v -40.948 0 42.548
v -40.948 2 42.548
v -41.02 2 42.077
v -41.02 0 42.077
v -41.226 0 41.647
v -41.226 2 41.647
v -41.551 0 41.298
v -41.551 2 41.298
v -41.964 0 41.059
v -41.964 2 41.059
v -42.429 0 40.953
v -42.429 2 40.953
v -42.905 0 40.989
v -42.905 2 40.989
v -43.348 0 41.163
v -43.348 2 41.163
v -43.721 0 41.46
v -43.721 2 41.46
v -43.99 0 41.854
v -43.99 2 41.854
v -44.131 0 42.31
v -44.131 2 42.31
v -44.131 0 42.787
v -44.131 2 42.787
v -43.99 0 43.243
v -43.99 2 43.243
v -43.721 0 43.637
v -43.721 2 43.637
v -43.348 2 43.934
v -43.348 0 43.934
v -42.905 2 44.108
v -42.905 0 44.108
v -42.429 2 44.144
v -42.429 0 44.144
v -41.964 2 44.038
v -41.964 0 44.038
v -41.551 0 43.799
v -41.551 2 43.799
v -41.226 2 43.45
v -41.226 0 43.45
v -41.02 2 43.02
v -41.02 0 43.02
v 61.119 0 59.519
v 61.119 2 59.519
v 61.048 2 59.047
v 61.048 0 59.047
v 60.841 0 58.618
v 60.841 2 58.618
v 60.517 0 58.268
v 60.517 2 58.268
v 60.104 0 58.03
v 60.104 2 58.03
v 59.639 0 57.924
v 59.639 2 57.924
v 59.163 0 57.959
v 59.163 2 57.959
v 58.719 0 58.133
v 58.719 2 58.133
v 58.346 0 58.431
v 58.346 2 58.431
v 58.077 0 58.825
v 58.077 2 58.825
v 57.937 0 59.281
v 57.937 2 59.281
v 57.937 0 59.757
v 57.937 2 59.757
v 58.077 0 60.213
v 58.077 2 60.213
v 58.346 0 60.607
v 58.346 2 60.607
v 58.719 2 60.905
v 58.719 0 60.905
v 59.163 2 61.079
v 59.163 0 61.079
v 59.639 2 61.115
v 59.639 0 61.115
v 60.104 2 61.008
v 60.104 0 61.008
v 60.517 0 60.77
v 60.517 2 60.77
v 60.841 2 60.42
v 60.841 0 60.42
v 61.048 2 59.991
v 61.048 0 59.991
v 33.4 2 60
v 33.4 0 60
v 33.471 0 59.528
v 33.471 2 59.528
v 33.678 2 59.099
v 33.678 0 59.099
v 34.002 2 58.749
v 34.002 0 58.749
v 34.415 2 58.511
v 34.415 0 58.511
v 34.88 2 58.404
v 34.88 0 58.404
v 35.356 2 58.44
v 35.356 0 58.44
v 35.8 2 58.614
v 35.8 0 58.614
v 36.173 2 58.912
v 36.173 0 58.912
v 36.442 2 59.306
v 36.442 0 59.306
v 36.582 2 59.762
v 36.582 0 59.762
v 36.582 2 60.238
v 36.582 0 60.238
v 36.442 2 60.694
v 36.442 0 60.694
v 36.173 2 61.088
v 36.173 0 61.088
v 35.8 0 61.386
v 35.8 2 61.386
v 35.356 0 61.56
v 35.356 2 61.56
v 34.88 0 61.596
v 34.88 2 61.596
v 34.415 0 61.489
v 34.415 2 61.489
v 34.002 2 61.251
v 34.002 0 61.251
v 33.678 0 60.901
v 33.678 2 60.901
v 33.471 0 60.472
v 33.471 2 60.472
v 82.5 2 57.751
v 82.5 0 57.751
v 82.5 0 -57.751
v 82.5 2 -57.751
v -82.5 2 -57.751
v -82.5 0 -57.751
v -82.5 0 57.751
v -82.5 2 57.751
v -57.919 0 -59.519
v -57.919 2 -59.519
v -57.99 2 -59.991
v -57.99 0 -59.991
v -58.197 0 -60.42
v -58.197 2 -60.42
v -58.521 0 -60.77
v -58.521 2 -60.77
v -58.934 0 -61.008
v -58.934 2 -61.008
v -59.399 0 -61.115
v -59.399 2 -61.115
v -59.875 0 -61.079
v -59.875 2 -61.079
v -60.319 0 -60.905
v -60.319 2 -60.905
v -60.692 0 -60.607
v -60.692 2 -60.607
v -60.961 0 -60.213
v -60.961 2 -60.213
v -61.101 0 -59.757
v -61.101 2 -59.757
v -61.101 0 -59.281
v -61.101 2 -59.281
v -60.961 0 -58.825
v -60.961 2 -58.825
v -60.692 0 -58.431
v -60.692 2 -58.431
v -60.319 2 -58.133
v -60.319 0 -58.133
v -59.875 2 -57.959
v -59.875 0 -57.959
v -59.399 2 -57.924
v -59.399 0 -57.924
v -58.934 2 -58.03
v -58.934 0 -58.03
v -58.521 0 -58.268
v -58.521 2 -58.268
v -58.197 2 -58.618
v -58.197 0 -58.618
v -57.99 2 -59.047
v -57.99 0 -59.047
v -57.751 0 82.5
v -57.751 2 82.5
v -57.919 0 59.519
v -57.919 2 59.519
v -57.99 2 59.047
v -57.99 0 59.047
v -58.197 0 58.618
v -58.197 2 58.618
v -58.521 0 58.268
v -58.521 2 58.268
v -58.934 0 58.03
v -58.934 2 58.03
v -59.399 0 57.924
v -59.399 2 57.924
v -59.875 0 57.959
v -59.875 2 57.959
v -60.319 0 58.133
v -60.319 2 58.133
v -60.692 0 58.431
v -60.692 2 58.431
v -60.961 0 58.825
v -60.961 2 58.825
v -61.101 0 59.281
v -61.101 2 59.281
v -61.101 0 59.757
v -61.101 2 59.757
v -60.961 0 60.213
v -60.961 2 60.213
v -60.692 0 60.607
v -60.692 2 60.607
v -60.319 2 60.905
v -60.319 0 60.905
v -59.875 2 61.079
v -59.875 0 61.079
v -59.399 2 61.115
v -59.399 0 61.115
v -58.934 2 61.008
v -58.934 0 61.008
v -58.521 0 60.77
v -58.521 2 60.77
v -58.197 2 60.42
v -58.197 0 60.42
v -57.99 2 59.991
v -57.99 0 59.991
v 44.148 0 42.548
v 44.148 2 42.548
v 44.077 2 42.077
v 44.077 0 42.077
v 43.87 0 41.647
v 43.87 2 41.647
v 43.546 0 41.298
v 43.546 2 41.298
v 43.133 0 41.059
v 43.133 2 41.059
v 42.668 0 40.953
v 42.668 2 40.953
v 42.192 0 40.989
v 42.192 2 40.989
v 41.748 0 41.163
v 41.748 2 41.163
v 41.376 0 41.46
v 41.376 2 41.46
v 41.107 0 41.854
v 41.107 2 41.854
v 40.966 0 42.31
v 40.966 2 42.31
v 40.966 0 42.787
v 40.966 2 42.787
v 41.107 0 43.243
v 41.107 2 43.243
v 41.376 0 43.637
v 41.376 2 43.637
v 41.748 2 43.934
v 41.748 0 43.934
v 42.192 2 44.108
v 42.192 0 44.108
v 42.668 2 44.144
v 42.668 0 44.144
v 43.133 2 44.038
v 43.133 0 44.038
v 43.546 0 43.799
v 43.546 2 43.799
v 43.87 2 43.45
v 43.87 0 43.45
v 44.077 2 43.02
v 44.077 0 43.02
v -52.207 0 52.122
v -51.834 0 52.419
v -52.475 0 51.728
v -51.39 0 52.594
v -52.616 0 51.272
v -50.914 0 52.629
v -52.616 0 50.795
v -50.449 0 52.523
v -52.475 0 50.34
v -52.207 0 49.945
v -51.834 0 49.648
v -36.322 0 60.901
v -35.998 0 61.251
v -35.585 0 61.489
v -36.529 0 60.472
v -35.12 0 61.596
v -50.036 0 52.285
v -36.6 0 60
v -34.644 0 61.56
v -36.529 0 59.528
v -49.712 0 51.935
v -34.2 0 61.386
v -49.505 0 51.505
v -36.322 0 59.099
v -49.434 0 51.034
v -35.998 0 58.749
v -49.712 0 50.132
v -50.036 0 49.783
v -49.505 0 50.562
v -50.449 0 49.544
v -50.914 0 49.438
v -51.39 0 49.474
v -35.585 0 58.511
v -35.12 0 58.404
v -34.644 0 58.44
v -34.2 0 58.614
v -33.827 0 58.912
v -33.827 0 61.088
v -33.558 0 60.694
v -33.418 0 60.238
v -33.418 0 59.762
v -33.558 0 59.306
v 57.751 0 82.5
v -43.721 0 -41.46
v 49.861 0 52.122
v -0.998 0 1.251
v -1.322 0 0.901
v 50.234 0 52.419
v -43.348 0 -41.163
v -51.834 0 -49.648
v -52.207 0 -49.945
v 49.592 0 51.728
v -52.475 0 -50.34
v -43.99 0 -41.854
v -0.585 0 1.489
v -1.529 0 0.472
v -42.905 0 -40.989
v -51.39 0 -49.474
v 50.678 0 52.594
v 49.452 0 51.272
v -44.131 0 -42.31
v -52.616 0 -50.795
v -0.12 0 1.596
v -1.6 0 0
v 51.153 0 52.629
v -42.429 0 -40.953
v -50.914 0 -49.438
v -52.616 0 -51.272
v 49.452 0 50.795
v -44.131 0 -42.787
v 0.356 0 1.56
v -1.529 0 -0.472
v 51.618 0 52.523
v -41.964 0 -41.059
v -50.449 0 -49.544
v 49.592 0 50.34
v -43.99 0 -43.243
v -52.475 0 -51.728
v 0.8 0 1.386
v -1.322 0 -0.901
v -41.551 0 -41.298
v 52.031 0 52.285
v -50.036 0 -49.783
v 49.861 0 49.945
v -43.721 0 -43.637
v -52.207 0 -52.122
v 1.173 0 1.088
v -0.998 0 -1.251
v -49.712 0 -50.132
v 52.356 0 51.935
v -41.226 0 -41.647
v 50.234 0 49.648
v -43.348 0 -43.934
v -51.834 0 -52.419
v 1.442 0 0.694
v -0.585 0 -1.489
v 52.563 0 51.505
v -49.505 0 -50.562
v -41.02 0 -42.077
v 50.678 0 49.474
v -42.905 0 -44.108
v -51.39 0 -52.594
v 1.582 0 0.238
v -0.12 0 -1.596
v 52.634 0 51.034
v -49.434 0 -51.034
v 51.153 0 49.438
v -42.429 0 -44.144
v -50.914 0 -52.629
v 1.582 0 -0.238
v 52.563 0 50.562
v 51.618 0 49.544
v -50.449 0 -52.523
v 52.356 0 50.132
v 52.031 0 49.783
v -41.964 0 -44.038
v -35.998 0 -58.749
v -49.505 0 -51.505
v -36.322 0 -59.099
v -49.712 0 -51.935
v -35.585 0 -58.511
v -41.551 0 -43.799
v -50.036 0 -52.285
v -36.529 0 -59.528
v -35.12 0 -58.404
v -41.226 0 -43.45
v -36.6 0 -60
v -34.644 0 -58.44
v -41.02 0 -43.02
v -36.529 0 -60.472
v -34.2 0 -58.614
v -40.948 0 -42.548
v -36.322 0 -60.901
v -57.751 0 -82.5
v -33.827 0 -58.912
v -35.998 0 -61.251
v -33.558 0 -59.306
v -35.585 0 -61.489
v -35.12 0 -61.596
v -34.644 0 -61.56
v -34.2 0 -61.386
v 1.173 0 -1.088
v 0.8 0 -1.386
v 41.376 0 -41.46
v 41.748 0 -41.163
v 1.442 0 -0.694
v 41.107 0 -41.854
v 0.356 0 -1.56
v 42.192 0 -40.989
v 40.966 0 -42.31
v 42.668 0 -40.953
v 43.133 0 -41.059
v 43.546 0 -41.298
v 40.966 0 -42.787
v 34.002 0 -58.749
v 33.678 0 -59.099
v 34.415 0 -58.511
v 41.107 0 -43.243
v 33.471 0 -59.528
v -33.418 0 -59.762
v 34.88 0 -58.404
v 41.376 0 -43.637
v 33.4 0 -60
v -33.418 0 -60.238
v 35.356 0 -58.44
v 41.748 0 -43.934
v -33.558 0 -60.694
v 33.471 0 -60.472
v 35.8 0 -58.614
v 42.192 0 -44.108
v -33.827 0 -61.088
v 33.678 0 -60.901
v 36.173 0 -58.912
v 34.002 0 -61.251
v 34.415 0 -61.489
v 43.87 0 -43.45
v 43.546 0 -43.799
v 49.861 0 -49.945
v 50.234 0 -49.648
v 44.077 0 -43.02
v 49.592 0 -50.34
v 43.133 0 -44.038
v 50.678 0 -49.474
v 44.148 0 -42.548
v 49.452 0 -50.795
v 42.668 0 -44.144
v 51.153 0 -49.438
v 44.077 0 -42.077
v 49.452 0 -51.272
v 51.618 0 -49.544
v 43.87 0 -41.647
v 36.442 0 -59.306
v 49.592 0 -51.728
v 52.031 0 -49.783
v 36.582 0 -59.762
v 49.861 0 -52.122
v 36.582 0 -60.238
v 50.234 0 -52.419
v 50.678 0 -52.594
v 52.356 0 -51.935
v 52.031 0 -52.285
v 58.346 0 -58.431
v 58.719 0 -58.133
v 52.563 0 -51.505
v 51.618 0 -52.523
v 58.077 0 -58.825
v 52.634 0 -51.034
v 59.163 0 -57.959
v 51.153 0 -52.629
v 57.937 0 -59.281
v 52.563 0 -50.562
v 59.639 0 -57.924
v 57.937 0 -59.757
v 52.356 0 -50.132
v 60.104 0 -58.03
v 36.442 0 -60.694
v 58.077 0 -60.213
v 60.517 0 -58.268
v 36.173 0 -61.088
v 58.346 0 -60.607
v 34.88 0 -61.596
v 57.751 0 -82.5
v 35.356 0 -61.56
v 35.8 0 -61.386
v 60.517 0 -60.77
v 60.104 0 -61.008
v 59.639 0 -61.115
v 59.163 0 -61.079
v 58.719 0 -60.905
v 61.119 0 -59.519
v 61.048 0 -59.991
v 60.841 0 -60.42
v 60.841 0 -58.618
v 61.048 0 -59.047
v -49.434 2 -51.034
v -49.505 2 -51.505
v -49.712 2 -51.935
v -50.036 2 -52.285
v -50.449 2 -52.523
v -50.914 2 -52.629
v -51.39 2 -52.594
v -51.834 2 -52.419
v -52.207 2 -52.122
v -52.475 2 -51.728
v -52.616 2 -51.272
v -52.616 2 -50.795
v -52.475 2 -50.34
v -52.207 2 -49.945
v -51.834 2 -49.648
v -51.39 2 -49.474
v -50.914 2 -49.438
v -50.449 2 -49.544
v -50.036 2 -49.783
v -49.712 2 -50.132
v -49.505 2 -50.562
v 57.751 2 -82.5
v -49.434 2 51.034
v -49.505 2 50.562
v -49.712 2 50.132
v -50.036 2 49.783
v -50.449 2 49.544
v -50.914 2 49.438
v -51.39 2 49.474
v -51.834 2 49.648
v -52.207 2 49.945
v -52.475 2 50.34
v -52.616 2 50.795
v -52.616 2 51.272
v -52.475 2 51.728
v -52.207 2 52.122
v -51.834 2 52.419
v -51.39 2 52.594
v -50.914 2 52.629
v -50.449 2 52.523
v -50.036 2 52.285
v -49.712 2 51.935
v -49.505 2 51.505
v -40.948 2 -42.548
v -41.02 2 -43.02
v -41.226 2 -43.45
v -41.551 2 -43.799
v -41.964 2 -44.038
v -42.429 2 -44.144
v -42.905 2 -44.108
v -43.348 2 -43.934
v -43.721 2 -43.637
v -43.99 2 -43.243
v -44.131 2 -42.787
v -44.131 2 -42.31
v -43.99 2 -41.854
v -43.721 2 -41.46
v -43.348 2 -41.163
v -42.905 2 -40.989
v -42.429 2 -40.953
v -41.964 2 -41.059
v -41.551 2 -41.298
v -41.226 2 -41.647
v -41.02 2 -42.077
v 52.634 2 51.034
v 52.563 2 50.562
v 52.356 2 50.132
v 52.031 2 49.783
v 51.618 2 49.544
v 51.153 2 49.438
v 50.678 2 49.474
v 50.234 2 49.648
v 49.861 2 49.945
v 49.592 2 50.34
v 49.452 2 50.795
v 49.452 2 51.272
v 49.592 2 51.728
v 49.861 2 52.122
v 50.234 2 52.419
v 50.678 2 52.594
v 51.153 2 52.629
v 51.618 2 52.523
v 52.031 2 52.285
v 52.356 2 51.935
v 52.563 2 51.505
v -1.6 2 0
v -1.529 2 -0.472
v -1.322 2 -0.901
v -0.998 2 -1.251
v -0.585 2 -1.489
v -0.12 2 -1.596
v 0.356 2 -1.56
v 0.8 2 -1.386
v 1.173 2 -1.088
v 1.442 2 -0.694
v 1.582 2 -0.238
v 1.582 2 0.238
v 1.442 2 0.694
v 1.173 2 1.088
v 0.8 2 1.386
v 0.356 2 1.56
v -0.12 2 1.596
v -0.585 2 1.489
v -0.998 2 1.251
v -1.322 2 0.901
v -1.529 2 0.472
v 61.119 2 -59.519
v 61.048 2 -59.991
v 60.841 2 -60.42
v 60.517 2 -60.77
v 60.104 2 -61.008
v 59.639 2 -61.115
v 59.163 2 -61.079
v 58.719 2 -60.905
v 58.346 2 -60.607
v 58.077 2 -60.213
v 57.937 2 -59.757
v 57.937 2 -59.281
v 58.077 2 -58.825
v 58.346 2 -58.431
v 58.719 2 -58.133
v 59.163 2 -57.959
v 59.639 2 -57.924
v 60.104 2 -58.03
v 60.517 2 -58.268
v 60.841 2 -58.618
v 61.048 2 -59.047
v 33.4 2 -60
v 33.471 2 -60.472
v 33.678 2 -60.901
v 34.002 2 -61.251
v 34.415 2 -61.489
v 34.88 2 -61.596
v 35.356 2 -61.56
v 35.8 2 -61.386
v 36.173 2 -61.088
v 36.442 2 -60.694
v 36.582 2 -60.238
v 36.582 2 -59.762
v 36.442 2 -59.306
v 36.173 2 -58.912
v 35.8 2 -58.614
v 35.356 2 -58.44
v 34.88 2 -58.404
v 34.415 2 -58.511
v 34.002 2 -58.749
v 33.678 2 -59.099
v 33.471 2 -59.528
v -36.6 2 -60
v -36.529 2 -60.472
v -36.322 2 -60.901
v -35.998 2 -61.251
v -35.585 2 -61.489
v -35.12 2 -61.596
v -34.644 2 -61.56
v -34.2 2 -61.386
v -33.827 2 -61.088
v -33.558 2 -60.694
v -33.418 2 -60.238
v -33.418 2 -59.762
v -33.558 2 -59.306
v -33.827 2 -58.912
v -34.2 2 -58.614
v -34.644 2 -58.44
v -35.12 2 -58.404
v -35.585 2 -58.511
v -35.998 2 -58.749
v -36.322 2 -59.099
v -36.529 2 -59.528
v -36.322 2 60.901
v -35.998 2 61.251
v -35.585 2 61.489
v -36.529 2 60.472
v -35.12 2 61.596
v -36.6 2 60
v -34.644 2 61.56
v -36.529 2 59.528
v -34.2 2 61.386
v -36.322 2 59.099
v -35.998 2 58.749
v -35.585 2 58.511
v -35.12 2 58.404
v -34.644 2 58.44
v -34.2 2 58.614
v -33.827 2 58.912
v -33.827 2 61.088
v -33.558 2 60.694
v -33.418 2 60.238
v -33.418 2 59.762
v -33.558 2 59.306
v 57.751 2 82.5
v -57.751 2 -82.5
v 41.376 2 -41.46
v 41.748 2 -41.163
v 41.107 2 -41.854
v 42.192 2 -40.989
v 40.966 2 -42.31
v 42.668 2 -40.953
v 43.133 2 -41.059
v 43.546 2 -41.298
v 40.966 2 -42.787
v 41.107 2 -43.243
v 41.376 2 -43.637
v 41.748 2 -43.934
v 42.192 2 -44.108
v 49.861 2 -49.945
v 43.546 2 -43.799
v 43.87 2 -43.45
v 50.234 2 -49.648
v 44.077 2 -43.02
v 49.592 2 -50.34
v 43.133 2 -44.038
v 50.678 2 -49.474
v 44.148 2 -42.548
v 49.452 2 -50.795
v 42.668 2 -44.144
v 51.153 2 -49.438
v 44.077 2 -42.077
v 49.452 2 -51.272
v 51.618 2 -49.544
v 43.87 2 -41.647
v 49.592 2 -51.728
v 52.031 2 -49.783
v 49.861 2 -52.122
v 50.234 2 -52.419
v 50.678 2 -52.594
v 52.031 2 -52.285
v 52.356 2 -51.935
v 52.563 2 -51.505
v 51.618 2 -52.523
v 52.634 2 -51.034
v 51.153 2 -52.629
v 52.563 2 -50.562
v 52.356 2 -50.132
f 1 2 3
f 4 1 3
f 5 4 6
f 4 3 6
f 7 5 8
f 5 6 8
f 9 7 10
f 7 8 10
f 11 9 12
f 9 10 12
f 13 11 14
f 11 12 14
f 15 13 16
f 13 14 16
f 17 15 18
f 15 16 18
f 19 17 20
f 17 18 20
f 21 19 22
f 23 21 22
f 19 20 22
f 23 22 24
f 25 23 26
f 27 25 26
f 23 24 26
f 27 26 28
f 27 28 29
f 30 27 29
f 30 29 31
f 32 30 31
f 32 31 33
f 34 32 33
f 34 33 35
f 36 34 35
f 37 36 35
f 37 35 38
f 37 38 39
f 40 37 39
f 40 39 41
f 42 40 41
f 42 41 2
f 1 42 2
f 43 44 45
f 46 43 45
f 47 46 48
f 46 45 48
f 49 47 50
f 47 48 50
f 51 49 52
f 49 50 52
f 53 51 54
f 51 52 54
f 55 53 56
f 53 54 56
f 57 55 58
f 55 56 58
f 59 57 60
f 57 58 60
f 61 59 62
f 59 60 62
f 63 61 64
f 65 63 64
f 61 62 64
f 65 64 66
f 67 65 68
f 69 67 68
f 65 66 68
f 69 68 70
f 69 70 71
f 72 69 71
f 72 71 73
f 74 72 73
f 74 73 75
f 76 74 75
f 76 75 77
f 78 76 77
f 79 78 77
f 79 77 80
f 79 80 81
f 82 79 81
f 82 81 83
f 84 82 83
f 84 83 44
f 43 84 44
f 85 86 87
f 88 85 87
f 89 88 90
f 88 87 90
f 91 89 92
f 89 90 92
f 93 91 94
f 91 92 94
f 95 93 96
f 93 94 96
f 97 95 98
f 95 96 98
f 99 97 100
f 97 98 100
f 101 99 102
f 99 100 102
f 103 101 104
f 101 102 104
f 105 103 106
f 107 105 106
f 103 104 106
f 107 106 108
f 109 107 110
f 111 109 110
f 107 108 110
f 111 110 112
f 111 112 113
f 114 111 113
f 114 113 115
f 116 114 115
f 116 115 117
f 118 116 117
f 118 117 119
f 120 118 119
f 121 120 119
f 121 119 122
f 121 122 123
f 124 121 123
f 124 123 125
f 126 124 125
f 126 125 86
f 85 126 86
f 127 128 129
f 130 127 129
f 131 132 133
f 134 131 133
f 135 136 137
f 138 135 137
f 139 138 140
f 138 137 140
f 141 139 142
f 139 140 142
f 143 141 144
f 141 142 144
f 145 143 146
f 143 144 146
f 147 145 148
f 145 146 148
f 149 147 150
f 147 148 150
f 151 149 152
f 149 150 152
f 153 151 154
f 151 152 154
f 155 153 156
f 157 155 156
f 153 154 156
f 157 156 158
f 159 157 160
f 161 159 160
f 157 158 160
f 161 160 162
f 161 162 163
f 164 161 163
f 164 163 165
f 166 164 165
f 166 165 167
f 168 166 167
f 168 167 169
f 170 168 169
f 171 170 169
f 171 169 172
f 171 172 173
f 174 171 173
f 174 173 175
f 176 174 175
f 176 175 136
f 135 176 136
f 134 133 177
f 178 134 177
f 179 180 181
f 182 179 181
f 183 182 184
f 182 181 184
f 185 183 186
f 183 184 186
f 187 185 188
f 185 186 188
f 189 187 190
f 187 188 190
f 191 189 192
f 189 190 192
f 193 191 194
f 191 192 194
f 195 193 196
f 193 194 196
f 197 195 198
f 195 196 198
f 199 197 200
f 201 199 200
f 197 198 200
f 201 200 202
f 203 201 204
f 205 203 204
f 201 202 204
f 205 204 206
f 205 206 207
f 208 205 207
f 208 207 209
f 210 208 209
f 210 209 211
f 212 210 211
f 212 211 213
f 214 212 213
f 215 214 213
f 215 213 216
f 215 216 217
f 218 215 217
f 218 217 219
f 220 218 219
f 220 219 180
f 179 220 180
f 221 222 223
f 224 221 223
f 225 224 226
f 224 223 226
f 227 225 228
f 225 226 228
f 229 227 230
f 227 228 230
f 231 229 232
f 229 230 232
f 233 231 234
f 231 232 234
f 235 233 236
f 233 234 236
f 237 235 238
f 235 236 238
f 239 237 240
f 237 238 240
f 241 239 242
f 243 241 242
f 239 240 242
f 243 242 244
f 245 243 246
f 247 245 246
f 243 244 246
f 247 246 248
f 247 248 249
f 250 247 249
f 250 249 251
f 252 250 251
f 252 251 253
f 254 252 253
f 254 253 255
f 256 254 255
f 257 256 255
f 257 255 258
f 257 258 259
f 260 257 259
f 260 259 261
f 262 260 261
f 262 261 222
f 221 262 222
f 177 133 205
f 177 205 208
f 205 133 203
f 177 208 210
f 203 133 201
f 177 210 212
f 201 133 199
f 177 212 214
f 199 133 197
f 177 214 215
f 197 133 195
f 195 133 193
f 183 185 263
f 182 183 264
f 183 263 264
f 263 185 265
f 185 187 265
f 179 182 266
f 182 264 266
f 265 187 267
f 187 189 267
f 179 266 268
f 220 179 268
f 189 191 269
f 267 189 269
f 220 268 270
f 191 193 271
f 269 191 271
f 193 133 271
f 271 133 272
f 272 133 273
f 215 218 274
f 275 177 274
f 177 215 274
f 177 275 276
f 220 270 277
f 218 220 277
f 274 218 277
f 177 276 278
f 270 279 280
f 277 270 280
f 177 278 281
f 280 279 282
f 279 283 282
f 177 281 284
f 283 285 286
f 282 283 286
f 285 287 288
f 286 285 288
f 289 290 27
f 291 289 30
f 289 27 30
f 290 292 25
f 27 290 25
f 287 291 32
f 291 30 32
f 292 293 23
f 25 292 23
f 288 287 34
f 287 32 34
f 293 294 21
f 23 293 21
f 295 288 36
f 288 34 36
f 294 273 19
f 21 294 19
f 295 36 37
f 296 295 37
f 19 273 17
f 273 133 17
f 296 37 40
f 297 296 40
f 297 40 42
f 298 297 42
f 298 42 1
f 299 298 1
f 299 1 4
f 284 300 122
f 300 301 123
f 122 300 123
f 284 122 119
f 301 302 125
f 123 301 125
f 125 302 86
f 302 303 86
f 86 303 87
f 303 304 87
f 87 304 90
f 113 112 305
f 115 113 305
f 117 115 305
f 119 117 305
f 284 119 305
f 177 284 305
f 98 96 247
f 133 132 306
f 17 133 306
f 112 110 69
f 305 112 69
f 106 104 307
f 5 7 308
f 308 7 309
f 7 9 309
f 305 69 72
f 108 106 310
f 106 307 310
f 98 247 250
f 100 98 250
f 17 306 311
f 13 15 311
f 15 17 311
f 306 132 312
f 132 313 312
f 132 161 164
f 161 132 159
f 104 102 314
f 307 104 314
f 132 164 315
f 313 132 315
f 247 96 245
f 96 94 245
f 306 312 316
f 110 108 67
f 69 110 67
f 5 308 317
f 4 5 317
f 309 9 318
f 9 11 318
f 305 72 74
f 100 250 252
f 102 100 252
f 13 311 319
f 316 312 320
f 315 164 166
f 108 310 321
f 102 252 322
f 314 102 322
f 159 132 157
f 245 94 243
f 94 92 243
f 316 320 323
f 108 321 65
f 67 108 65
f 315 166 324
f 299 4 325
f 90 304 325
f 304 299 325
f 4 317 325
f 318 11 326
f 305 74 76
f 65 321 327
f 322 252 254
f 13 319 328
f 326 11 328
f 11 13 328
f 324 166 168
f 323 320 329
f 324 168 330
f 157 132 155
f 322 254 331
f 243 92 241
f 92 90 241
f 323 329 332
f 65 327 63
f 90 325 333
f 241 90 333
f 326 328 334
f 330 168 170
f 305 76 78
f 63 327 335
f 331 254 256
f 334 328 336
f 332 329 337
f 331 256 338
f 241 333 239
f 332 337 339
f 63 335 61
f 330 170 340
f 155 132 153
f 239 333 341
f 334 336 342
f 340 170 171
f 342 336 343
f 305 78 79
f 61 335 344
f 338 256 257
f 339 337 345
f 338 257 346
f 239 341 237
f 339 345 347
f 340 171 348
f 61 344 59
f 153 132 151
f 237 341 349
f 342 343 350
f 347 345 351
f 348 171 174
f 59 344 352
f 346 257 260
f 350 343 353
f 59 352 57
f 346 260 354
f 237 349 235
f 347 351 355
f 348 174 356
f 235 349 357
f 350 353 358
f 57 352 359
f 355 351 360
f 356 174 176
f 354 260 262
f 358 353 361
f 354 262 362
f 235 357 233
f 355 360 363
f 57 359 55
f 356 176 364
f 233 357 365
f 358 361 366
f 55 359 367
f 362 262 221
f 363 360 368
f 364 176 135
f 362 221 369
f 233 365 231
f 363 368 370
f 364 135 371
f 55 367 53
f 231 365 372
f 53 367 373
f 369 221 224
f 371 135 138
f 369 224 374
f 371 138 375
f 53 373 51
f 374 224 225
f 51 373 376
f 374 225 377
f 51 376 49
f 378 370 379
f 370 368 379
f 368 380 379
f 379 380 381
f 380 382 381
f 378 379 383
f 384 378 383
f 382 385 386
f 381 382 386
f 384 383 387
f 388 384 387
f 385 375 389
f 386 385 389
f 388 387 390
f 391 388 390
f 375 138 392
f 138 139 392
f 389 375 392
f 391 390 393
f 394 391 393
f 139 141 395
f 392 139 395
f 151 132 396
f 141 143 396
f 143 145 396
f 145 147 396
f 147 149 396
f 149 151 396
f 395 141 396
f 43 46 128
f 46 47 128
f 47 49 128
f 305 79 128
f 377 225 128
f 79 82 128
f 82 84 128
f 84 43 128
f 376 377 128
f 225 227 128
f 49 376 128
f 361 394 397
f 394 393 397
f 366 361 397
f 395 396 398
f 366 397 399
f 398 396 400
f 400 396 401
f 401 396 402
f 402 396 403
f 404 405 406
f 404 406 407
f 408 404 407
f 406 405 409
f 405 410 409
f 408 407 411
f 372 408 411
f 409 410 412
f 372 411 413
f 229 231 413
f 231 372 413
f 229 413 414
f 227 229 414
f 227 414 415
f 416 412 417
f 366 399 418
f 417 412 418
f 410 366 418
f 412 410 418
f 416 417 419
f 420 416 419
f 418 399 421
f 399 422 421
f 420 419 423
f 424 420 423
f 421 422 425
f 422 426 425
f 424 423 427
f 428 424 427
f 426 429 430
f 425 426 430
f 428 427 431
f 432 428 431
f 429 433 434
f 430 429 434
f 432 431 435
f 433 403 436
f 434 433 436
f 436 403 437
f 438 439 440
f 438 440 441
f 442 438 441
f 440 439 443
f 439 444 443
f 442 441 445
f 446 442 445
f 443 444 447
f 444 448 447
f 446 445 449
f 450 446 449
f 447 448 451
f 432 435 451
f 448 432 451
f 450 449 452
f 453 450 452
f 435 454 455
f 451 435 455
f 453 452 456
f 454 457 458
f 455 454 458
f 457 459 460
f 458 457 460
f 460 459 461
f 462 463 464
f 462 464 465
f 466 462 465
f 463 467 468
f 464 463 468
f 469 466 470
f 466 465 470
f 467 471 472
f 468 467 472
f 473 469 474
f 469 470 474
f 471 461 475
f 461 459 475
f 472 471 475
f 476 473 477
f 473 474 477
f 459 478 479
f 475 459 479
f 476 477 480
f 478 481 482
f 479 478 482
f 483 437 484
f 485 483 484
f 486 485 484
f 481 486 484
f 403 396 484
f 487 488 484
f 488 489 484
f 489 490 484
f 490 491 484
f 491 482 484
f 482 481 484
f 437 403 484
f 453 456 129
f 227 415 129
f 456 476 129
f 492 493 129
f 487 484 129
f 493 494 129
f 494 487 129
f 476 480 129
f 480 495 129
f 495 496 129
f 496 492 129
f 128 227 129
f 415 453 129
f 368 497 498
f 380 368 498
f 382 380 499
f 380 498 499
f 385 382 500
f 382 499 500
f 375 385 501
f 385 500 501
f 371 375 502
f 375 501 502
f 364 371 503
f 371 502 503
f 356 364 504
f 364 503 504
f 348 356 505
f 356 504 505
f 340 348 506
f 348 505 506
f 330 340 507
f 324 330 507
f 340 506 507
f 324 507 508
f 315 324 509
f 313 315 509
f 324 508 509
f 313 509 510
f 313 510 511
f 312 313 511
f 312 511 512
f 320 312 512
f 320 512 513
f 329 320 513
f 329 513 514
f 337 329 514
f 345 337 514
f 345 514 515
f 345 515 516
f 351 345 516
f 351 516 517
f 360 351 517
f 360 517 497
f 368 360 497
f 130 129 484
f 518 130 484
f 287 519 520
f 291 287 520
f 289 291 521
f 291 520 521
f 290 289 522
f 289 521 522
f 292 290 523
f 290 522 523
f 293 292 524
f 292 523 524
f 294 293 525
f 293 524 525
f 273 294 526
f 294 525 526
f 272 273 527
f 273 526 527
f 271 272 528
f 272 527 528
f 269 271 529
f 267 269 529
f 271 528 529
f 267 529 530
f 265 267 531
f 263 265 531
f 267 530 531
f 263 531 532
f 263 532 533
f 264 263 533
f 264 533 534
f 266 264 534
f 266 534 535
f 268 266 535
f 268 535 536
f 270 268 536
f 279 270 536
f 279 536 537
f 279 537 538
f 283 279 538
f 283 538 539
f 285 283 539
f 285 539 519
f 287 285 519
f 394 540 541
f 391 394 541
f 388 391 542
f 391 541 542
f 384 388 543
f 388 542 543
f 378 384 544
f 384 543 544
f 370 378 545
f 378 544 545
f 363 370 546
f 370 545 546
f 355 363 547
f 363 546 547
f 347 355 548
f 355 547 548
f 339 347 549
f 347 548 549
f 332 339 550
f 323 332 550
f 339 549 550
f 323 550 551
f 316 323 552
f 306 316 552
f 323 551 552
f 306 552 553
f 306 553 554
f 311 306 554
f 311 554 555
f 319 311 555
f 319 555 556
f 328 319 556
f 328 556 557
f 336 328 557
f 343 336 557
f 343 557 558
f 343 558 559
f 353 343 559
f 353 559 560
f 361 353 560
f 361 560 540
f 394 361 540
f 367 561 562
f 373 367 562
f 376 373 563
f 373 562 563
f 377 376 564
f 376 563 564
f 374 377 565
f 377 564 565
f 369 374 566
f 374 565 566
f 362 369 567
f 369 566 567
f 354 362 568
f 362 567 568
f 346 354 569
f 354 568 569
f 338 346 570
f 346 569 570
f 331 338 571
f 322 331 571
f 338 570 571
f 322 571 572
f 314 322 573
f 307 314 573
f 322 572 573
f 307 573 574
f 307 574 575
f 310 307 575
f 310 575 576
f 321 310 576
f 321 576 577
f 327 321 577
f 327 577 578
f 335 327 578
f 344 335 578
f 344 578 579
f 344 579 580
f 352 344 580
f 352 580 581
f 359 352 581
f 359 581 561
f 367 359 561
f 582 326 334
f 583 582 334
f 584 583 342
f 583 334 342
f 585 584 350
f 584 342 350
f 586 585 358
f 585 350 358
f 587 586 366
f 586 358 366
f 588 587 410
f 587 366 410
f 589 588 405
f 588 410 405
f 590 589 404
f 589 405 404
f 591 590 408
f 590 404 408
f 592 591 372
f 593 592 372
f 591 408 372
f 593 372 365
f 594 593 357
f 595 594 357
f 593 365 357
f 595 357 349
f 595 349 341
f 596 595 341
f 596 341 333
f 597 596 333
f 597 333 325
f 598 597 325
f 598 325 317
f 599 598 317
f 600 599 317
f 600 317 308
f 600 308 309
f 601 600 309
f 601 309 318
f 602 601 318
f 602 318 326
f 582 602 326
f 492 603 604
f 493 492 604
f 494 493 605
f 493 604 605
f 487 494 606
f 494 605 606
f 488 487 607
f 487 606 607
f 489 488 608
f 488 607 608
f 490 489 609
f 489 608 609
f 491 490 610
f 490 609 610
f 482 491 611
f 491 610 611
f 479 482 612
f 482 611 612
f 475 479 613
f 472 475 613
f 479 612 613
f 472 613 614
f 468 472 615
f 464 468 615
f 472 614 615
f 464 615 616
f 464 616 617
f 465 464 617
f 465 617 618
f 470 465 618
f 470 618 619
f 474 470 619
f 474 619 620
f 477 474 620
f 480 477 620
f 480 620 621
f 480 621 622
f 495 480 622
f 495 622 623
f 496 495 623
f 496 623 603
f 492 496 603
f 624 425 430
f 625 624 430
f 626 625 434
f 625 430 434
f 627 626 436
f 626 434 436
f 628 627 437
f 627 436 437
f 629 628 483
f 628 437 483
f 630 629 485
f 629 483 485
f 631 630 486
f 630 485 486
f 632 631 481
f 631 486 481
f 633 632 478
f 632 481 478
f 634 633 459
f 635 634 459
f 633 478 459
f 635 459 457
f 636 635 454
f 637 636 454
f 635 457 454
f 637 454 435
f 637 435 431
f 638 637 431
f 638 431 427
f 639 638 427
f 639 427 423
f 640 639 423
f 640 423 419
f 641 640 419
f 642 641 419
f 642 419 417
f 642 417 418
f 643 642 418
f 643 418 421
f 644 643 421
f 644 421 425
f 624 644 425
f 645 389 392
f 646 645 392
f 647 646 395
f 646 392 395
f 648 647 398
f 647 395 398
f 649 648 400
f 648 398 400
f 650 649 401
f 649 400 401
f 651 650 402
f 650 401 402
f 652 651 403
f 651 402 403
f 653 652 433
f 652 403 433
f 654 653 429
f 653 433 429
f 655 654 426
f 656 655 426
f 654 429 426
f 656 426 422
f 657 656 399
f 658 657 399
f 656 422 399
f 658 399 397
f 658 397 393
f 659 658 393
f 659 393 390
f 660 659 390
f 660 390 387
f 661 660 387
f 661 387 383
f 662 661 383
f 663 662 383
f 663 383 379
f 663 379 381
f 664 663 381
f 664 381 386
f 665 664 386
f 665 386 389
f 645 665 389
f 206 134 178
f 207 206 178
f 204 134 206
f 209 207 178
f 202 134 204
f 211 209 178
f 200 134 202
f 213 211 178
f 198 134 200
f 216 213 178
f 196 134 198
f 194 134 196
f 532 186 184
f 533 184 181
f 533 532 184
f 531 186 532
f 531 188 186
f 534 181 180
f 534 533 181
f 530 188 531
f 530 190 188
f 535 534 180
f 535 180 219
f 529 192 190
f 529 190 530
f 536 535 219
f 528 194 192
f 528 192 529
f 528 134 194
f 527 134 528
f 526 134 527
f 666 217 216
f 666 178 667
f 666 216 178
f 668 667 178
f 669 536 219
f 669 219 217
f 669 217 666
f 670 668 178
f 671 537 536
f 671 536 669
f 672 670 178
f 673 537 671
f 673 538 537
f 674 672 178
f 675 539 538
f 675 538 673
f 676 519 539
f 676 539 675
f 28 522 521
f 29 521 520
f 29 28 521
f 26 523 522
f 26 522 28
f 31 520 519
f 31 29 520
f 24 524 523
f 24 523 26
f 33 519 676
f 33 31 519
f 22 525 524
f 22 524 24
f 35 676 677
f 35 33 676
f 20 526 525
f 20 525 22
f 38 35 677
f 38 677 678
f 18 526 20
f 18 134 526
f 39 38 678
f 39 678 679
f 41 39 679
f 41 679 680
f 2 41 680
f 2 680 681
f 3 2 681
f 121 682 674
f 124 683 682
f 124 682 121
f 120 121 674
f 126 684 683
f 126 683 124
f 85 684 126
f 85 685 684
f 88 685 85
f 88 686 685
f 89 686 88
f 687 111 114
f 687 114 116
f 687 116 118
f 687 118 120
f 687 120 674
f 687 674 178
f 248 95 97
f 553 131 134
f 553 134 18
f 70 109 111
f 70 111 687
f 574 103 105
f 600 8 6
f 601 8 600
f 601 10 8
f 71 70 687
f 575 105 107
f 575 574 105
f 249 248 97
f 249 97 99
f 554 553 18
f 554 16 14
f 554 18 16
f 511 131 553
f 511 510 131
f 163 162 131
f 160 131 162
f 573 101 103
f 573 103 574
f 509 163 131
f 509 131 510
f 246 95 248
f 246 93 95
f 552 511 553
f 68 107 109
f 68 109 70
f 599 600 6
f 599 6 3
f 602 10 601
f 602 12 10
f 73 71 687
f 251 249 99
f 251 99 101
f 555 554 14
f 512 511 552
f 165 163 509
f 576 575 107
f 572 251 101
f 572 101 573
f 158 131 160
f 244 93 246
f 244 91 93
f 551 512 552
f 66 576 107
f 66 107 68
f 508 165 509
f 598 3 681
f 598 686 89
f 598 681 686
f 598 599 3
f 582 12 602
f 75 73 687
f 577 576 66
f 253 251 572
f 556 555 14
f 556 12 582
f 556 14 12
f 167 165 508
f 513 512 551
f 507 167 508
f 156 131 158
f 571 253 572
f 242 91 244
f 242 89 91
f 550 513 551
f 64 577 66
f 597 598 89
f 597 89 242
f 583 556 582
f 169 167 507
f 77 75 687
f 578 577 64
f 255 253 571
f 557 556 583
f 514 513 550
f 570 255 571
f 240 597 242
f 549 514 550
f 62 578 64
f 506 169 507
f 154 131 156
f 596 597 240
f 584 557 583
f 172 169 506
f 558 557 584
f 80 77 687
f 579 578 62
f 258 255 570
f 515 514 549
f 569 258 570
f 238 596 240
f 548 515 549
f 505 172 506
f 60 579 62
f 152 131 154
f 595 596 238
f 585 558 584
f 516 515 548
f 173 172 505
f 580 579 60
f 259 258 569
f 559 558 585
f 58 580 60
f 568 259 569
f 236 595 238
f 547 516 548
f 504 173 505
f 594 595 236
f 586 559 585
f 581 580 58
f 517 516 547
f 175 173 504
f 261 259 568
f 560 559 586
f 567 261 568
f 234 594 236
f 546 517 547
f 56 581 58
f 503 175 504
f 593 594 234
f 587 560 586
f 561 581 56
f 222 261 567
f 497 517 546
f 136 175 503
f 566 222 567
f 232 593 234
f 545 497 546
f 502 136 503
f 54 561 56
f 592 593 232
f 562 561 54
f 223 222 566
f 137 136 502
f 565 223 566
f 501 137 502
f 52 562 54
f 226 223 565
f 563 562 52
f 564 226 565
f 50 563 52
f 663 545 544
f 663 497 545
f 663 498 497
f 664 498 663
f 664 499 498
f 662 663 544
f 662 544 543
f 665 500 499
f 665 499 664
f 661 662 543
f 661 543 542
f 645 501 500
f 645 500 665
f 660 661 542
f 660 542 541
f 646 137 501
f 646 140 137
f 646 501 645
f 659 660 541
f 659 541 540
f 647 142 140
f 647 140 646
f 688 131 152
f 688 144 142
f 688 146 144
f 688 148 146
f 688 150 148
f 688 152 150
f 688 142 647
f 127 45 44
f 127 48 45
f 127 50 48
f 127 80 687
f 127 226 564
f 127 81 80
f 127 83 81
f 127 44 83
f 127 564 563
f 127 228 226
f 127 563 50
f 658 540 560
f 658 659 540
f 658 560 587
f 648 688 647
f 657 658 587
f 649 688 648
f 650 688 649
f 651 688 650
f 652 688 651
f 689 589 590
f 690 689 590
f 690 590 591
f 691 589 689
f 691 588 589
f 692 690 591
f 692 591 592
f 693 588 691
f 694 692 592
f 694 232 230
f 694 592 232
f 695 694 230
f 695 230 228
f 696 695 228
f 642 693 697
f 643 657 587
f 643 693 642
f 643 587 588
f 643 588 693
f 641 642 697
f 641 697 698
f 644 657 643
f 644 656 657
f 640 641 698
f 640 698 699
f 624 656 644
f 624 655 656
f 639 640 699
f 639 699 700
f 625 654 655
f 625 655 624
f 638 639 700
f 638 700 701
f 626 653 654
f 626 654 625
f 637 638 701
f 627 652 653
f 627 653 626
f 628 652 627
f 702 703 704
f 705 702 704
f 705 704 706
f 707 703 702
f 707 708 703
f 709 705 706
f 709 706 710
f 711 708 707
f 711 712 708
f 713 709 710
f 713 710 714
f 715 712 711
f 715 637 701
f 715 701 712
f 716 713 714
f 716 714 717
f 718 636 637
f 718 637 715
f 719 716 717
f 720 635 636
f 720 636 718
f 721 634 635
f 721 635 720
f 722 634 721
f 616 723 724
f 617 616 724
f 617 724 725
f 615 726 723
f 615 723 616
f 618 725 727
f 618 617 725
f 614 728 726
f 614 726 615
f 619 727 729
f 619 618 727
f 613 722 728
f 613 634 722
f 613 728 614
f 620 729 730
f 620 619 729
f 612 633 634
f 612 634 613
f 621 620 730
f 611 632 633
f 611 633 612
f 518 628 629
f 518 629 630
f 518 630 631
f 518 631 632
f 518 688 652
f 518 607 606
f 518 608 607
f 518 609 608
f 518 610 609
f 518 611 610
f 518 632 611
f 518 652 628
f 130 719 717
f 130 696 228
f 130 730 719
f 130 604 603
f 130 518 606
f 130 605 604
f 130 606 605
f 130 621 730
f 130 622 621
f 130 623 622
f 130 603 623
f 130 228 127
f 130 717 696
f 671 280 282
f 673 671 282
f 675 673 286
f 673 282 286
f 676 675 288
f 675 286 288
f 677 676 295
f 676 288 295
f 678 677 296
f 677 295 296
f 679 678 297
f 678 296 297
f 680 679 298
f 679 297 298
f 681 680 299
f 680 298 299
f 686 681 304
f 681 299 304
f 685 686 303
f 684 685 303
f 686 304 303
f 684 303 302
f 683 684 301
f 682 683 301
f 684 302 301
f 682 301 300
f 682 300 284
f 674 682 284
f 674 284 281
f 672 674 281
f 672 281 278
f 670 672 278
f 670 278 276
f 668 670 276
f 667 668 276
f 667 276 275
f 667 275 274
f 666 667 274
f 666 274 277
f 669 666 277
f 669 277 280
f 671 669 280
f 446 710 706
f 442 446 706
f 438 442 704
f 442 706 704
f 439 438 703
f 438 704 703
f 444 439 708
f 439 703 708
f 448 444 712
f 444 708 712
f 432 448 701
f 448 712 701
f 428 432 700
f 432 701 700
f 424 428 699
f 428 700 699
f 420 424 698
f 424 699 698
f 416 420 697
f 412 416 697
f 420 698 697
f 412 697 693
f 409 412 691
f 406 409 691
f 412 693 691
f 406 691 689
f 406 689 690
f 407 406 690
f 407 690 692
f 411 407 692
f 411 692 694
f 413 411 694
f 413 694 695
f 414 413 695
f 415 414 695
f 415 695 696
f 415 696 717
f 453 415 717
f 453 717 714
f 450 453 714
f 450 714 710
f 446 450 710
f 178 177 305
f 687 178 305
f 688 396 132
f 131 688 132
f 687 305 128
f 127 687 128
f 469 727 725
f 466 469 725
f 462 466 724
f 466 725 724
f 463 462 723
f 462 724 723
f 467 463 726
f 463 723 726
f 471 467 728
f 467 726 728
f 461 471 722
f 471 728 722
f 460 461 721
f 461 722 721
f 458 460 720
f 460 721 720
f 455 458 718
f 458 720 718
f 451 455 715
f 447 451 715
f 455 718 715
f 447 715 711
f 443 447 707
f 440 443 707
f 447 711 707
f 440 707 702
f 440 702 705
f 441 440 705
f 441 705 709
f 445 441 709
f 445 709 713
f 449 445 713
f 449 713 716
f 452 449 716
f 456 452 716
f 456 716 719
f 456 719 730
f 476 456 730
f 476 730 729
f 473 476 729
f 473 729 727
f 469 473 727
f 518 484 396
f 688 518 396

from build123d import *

# Parameters (mm, degrees)
BOSS_EXTRUDE1_DEPTH  = 2
M3_CLEARANCE_HOLE1_D = 3.2
M3_CLEARANCE_HOLE2_D = 3.2


with BuildPart() as part:
    # Sketch1 → Boss-Extrude1 (new body)
    with BuildSketch(Plane(origin=(0, 0, 0), x_dir=(1, 0, 0), z_dir=(0, 1, 0))):
        Polygon((-57.751262658, 82.5), (-82.5, 57.751262658), (-82.5, -57.751262658), (-57.751262658, -82.5), (57.751262658, -82.5), (82.5, -57.751262658), (82.5, 57.751262658), (57.751262658, 82.5), align=None)
    extrude(amount=BOSS_EXTRUDE1_DEPTH)

    # M3 Clearance Hole1 (through all)
    with Locations(Plane(origin=(0, 0, 0), x_dir=(-1, 0, 0), z_dir=(0, -1, 0))):
        with Locations((42.548466863, -42.548466863), (59.519029611, 59.519029611), (51.033748237, 51.033748237), (42.548466863, 42.548466863), (-59.519029611, -59.519029611), (-51.033748237, -51.033748237), (-42.548466863, -42.548466863), (-59.519029611, 59.519029611), (-51.033748237, 51.033748237), (-42.548466863, 42.548466863), (59.519029611, -59.519029611), (51.033748237, -51.033748237)):
            Hole(M3_CLEARANCE_HOLE1_D / 2)

    # M3 Clearance Hole2 (through all)
    with Locations(Plane(origin=(0, 2, 0), x_dir=(1, 0, 0), z_dir=(0, 1, 0))):
        with Locations((0, 0), (-35, 60), (35, -60), (35, 60), (-35, -60)):
            Hole(M3_CLEARANCE_HOLE2_D / 2)


solid = part.part
